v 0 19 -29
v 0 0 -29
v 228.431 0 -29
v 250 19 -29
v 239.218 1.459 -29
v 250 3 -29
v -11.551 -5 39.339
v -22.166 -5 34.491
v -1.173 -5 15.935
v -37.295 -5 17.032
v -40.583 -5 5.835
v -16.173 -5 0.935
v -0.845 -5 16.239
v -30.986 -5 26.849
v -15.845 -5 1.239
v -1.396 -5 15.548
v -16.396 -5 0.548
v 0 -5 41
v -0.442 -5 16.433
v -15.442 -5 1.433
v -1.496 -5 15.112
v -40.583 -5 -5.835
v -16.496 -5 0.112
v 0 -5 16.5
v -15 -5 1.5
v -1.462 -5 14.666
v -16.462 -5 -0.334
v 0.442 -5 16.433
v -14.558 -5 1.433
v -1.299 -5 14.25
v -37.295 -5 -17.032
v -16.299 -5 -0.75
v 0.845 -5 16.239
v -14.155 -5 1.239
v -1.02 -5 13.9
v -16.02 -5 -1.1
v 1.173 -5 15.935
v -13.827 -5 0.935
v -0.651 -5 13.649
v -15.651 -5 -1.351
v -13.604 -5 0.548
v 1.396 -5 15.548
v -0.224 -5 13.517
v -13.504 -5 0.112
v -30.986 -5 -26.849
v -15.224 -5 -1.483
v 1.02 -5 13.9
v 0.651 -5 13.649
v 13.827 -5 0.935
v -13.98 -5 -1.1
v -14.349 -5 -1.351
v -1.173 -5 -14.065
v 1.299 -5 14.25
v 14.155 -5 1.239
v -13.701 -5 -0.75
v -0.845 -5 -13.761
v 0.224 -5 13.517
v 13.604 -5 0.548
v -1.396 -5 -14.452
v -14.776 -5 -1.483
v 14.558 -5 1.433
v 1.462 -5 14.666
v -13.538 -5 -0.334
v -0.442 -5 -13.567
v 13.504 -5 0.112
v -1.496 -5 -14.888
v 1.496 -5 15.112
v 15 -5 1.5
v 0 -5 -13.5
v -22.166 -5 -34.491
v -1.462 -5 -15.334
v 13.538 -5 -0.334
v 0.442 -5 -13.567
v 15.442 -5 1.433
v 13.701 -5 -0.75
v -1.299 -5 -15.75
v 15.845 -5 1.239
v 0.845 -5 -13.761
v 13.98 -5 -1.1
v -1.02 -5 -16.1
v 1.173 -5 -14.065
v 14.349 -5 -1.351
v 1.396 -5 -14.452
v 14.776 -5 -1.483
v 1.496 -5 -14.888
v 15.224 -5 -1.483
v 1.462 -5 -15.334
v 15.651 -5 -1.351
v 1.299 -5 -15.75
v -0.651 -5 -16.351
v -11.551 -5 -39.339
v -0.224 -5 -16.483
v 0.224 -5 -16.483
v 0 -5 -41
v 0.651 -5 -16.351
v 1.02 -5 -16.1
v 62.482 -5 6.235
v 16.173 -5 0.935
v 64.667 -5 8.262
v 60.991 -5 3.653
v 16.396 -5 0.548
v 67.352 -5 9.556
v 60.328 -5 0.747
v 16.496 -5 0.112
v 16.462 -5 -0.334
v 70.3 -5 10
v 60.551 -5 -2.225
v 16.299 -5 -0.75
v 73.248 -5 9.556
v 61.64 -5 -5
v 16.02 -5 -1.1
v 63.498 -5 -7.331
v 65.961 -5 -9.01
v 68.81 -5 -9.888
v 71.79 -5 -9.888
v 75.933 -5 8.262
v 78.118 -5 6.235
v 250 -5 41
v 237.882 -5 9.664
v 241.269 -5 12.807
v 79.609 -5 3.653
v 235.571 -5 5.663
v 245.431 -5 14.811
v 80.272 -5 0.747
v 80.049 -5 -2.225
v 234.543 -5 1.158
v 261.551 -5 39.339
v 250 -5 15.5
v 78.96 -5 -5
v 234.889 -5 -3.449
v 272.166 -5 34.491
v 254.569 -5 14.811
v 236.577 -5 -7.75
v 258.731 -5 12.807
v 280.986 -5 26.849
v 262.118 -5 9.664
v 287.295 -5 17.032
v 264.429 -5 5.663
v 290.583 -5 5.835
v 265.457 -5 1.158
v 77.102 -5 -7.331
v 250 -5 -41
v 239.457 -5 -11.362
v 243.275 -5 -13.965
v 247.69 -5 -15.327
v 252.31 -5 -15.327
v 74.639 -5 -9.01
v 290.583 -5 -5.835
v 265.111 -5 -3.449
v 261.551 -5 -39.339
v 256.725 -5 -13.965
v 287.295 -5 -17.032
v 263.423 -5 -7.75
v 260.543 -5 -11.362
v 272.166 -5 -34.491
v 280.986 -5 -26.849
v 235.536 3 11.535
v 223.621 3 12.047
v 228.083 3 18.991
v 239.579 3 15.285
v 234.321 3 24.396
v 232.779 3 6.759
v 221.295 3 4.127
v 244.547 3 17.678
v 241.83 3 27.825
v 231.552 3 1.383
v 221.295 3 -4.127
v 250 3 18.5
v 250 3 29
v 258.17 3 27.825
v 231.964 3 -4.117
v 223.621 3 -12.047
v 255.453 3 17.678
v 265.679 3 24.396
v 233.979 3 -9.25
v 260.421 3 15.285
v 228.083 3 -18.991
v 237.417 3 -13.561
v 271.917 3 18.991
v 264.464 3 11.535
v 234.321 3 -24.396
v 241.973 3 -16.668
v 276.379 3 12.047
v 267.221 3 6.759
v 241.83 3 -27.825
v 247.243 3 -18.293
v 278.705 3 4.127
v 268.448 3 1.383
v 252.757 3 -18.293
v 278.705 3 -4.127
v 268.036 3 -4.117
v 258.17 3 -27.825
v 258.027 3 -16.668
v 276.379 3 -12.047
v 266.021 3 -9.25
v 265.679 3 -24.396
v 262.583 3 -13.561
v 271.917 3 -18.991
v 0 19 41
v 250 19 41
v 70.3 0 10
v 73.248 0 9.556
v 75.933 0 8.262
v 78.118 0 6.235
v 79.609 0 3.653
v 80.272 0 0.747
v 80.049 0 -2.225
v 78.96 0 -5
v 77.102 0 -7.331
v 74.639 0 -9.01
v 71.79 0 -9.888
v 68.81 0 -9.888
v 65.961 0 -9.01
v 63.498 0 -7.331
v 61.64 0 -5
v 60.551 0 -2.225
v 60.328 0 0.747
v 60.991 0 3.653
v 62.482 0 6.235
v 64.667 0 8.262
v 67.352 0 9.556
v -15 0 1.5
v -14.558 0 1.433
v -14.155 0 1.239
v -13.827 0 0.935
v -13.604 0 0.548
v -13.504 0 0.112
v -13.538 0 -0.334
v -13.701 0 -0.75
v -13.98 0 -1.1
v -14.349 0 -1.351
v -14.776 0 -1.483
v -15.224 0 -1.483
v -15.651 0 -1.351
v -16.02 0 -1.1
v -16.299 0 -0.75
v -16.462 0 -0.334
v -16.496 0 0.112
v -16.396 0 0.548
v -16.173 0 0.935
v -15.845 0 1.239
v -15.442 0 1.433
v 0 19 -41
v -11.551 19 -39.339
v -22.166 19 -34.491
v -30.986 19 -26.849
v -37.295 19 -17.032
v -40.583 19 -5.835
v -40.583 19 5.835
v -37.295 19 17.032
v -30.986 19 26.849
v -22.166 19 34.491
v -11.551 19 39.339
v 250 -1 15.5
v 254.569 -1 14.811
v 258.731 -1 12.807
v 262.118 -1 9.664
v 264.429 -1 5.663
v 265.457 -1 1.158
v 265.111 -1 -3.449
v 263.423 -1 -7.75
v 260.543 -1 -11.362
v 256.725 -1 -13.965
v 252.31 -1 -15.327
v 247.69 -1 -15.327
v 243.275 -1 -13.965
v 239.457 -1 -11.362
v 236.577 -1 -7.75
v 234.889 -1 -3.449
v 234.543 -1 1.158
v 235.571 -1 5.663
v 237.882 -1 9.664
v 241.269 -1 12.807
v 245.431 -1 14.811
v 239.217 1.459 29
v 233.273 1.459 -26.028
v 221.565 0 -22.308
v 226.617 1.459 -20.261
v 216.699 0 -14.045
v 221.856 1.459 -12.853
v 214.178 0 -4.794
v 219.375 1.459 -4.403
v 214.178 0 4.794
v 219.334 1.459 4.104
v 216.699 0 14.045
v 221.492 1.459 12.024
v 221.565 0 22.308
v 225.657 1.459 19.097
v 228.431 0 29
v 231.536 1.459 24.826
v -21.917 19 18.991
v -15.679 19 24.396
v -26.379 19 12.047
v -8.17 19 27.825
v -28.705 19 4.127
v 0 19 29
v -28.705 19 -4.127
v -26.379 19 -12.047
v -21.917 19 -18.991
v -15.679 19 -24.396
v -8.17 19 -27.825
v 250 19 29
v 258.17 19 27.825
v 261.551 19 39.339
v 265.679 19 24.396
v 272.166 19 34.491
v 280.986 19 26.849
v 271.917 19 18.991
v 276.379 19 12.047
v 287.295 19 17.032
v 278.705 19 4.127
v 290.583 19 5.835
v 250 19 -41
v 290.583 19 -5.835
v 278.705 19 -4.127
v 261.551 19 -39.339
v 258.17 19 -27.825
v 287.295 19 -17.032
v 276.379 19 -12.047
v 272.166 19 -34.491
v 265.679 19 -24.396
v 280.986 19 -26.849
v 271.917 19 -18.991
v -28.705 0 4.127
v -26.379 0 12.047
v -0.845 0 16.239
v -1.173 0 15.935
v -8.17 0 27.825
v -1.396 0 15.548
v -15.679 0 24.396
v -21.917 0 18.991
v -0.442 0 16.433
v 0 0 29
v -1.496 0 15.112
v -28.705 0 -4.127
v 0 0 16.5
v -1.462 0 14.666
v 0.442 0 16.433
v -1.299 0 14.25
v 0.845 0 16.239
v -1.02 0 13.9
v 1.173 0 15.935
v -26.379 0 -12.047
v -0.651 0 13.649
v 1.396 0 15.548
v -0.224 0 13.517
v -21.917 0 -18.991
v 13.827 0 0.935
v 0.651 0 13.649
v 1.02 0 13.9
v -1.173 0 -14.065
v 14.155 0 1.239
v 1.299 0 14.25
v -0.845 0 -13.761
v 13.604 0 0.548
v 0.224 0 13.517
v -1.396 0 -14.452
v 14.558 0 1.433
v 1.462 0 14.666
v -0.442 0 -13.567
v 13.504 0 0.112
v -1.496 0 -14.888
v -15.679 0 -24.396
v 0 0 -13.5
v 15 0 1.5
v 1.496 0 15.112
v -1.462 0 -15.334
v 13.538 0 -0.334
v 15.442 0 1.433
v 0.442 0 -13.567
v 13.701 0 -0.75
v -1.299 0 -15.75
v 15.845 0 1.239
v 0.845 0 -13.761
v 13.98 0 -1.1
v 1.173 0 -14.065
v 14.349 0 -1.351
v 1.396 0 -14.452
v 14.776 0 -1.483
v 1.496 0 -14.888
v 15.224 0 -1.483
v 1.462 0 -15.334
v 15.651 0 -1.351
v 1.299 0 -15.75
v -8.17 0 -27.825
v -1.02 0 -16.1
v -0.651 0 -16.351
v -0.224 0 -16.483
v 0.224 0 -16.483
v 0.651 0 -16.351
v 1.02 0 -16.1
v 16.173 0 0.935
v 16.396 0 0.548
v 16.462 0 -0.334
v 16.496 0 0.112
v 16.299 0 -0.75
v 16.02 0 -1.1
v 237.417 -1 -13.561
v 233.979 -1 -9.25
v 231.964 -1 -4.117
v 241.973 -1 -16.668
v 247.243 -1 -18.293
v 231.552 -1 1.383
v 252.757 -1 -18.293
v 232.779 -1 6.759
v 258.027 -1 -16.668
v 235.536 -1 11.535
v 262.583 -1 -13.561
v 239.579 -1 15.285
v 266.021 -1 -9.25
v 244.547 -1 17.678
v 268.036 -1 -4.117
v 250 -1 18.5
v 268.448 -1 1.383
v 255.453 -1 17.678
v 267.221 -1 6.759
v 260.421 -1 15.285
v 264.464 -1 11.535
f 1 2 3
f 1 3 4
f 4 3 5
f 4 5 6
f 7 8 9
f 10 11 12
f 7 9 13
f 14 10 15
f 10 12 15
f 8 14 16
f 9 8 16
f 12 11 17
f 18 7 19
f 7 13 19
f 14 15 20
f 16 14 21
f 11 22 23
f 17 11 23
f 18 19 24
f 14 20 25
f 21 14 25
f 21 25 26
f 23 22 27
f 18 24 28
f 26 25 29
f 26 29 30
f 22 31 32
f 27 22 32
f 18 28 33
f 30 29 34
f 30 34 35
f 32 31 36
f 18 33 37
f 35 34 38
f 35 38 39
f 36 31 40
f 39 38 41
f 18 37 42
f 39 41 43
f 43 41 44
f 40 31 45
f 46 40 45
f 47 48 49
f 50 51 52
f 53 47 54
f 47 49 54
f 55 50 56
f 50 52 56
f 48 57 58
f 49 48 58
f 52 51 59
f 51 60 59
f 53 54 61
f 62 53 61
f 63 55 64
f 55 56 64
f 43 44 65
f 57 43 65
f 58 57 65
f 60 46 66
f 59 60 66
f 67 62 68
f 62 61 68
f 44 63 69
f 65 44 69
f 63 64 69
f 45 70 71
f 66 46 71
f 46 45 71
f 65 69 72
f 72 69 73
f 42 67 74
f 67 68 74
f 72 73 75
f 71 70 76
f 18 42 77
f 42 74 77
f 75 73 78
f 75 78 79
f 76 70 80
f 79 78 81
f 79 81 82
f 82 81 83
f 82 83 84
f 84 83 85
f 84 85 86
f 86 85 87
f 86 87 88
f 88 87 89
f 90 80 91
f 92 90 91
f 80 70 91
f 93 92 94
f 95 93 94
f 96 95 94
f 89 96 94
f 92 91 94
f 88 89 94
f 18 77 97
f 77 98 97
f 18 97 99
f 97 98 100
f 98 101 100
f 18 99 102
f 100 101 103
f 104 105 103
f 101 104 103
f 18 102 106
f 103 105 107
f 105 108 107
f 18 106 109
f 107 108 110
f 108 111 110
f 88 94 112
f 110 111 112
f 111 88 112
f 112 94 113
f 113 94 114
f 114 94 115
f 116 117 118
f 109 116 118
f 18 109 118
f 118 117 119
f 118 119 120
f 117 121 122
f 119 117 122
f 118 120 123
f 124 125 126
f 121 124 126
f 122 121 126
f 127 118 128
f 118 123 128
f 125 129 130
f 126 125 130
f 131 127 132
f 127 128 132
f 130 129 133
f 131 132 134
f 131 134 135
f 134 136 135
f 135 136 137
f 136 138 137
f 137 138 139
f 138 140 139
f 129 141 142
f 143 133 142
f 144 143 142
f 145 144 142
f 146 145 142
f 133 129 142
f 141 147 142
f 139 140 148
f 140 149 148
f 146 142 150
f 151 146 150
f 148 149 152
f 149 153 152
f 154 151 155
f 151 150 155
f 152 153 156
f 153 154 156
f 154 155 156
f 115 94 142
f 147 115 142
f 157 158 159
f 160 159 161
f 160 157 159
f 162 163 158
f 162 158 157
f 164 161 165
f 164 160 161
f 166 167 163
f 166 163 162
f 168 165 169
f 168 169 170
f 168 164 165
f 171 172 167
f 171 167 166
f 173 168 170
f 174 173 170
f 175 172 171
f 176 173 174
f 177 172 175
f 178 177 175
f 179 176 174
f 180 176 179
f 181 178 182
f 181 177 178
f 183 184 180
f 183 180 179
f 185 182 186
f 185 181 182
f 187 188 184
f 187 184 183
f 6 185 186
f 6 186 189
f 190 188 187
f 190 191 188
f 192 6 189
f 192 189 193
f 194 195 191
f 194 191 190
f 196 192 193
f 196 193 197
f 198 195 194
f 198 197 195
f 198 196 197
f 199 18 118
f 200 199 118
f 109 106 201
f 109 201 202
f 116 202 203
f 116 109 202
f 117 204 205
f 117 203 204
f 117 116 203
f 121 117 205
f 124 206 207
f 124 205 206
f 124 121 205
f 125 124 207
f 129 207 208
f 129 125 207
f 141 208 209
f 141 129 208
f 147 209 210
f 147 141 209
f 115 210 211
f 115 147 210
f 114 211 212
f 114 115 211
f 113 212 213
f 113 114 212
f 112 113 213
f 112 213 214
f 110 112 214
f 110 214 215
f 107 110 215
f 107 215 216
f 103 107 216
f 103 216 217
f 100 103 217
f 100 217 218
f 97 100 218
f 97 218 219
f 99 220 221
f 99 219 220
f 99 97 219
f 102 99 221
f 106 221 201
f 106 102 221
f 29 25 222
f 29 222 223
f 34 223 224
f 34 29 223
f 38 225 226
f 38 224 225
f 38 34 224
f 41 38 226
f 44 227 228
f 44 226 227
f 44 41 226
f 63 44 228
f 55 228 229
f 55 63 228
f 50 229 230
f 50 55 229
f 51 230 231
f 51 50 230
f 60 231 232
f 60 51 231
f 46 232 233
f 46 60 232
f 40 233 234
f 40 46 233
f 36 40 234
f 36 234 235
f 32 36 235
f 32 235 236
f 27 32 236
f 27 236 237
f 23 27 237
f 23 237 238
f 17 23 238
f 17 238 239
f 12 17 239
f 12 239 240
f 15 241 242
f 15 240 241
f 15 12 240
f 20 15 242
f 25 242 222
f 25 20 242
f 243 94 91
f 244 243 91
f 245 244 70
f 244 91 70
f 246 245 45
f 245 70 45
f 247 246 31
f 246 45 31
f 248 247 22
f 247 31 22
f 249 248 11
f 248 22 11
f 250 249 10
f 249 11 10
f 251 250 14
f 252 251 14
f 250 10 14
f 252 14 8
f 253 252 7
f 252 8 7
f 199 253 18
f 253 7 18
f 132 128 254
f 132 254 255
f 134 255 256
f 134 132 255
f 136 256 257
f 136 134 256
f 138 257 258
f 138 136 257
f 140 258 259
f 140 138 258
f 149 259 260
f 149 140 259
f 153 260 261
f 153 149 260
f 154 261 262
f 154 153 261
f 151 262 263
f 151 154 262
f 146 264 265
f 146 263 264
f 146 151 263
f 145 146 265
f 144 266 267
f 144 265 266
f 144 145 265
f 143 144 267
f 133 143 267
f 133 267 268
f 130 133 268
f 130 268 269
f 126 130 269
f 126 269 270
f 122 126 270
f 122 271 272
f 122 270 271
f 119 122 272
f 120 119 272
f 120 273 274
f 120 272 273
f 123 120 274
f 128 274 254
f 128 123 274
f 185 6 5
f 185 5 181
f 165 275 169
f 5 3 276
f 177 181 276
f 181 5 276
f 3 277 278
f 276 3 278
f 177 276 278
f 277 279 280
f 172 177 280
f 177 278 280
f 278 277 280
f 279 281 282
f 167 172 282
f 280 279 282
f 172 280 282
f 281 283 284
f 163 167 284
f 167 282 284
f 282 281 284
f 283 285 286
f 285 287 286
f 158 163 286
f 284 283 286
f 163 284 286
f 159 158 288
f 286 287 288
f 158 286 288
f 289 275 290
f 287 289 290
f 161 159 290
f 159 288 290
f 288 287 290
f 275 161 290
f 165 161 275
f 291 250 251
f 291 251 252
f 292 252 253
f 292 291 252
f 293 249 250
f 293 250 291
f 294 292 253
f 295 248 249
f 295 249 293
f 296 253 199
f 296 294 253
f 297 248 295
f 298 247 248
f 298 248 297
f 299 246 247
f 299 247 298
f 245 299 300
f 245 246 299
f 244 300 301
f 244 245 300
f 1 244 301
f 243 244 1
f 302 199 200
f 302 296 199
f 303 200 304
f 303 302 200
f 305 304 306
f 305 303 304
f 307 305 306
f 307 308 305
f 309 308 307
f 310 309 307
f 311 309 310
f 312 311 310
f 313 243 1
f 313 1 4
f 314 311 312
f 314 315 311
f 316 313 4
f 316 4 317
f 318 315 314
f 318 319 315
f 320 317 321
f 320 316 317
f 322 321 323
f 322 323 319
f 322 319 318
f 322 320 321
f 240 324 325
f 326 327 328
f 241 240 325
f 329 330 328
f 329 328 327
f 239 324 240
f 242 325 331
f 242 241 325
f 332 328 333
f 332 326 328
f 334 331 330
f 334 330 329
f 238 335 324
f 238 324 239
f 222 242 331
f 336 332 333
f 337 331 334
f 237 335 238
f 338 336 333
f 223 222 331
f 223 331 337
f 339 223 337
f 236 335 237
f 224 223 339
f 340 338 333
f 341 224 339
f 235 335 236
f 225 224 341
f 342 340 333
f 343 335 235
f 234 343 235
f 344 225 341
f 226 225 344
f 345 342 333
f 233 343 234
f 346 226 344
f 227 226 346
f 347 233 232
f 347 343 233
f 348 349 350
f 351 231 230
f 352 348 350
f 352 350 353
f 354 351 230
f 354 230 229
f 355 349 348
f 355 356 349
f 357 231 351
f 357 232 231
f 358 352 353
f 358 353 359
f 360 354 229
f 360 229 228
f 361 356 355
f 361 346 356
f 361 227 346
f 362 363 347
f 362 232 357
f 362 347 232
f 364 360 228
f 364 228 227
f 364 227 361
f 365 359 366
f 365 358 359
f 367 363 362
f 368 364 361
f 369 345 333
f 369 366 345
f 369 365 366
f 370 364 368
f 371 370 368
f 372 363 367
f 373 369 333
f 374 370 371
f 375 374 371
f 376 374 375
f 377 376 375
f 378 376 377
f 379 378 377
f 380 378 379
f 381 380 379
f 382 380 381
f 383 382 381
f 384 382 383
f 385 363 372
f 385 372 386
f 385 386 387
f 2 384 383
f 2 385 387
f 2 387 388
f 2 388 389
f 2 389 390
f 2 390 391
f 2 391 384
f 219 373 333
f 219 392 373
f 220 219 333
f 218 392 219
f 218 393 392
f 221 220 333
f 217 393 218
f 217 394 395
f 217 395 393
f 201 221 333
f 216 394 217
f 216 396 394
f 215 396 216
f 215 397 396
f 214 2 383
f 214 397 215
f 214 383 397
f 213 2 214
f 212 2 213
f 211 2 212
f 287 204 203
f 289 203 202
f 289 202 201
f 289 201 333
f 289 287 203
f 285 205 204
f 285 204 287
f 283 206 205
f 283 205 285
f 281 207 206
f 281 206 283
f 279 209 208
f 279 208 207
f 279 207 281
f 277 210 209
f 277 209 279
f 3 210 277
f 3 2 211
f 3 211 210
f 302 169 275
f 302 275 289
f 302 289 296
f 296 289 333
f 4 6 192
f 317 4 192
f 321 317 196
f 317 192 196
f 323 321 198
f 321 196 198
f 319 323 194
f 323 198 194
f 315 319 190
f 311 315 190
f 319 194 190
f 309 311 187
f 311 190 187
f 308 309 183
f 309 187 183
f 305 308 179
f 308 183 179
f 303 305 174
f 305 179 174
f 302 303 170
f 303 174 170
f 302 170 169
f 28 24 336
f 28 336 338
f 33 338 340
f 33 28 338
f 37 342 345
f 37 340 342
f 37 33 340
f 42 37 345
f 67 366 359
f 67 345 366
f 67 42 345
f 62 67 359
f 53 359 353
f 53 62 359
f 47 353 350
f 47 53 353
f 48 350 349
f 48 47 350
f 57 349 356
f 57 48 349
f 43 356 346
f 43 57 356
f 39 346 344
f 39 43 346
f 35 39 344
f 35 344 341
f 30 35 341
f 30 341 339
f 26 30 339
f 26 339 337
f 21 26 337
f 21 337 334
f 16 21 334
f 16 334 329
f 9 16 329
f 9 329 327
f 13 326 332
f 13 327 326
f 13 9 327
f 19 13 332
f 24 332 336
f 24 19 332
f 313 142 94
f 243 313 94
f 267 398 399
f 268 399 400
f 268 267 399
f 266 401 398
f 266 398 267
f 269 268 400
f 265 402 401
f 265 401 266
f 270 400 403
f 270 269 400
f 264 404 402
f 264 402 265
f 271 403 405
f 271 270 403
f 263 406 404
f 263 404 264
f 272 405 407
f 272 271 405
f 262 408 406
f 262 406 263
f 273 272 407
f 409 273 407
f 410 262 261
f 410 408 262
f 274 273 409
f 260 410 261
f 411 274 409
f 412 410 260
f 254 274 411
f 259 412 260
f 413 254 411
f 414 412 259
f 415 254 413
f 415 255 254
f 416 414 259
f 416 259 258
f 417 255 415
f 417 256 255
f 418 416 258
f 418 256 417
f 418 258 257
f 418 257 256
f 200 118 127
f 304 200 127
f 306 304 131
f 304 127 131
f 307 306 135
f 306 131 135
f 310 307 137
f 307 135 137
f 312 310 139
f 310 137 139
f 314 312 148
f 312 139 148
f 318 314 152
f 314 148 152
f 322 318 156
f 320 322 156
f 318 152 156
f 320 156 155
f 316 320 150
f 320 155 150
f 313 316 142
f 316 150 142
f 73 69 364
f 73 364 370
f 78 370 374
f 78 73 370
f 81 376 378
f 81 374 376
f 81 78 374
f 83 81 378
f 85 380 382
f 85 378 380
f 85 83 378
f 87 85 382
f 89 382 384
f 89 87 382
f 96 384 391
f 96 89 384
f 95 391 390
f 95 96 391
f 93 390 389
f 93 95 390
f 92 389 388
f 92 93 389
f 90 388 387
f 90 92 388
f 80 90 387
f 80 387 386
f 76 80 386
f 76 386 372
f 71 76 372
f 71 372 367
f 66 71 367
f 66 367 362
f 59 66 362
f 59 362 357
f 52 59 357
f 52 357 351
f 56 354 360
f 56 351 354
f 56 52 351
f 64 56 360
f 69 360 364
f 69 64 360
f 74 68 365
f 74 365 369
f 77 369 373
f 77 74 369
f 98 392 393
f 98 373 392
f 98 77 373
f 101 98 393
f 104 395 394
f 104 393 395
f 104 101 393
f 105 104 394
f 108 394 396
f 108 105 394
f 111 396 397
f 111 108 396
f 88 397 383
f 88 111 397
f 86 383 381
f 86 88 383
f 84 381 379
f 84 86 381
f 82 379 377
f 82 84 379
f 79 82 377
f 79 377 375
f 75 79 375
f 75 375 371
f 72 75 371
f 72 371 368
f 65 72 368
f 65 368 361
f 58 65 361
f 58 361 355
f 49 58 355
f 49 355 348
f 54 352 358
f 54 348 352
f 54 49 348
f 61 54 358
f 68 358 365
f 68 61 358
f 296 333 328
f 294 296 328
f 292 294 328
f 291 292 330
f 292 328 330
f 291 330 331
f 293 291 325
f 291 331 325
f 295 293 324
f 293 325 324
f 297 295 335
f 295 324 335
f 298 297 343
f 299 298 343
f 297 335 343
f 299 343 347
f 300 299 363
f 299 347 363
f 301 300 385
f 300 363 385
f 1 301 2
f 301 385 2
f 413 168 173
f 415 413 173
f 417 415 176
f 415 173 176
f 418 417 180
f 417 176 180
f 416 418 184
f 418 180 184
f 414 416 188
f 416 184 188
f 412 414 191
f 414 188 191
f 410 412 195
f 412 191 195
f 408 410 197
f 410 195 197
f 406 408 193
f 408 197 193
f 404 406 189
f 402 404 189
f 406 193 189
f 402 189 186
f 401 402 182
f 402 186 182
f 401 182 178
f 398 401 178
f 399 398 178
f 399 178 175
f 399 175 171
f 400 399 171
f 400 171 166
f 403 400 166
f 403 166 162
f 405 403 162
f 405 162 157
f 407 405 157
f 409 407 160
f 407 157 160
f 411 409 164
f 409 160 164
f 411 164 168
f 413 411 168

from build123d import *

# Parameters (mm, degrees)
BOSS_EXTRUDE1_DEPTH     = 19
BOSS_EXTRUDE2_START     = -5
BOSS_EXTRUDE2_DEPTH     = 5
CUT_EXTRUDE1_DEPTH      = 295.487690744
CUT_EXTRUDE1_DEPTH_BACK = 295.487690744
SKETCH3_R               = 1.5
SKETCH4_R               = 29
BOSS_EXTRUDE3_DEPTH     = 3
SKETCH5_R               = 18.5
CUT_EXTRUDE2_DEPTH      = 4
CUT_EXTRUDE3_DEPTH      = 295.553899991
CUT_EXTRUDE3_DEPTH_BACK = 295.553899991
SKETCH6_R               = 15.5
FILLET1_R               = 10
CUT_EXTRUDE4_DEPTH      = 295.487690751
CUT_EXTRUDE4_DEPTH_BACK = 295.487690751
SKETCH7_R               = 10


with BuildPart() as part:
    # Sketch1 → Boss-Extrude1 (new body)
    with BuildSketch(Plane(origin=(0, 0, 0), x_dir=(1, 0, 0), z_dir=(0, 1, 0))):
        with BuildLine():
            Line((0, -41), (250, -41))
            ThreePointArc((250, -41), (291, 0), (250, 41))
            Line((250, 41), (0, 41))
            ThreePointArc((0, 41), (-41, 0), (0, -41))
        make_face()
        with BuildLine():
            Line((0, 29), (250, 29))
            ThreePointArc((250, 29), (279, 0), (250, -29))
            Line((250, -29), (0, -29))
            ThreePointArc((0, -29), (-29, 0), (0, 29))
        make_face(mode=Mode.SUBTRACT)
    extrude(amount=BOSS_EXTRUDE1_DEPTH)

    # Sketch1<2> → Boss-Extrude2 (add)
    with BuildSketch(Plane(origin=(0, 0, 0), x_dir=(1, 0, 0), z_dir=(0, 1, 0)).offset(BOSS_EXTRUDE2_START)):
        with BuildLine():
            ThreePointArc((0, 41), (-41, 0), (0, -41))
            Line((0, -41), (250, -41))
            ThreePointArc((250, -41), (291, 0), (250, 41))
            Line((250, 41), (0, 41))
        make_face()
    extrude(amount=BOSS_EXTRUDE2_DEPTH)

    # Sketch3 → Cut-Extrude1 (cut, two sides: drawn at the far end of the back side and taken through both)
    with BuildSketch(Plane(origin=(0, 0, 0), x_dir=(1, 0, 0), z_dir=(0, 1, 0)).offset(-CUT_EXTRUDE1_DEPTH_BACK)):
        with Locations(Location((0, 15, 0), (0, 0, 270))):
            Circle(SKETCH3_R)
        with Locations(Location((15, 0, 0), (0, 0, 270))):
            Circle(SKETCH3_R)
        with Locations(Location((0, -15, 0), (0, 0, 270))):
            Circle(SKETCH3_R)
        with Locations(Location((-15, 0, 0), (0, 0, 270))):
            Circle(SKETCH3_R)
    extrude(amount=CUT_EXTRUDE1_DEPTH + CUT_EXTRUDE1_DEPTH_BACK, mode=Mode.SUBTRACT)

    # Sketch4 → Boss-Extrude3 (add)
    with BuildSketch(Plane(origin=(0, 0, 0), x_dir=(1, 0, 0), z_dir=(0, 1, 0))):
        with Locations((250, 0)):
            Circle(SKETCH4_R)
    extrude(amount=BOSS_EXTRUDE3_DEPTH)

    # Sketch5 → Cut-Extrude2 (cut)
    with BuildSketch(Plane(origin=(0, 3, 0), x_dir=(1, 0, 0), z_dir=(0, 1, 0))):
        with Locations(Location((250, 0, 0), (0, 0, 270))):
            Circle(SKETCH5_R)
    extrude(amount=-CUT_EXTRUDE2_DEPTH, mode=Mode.SUBTRACT)

    # Sketch6 → Cut-Extrude3 (cut, two sides: drawn at the far end of the back side and taken through both)
    with BuildSketch(Plane(origin=(0, -1, 0), x_dir=(1, 0, 0), z_dir=(0, 1, 0)).offset(-CUT_EXTRUDE3_DEPTH_BACK)):
        with Locations(Location((250, 0, 0), (0, 0, 270))):
            Circle(SKETCH6_R)
    extrude(amount=CUT_EXTRUDE3_DEPTH + CUT_EXTRUDE3_DEPTH_BACK, mode=Mode.SUBTRACT)

    # Fillet1
    # the kernel refuses this fillet: 10 mm, written as the material it adds along each edge
    with BuildSketch(Plane(origin=(250, 0, 0), x_dir=(0.5782894613752282, 0, -0.8158316608604672), z_dir=(0.8158316608604672, 0, 0.5782894613752282))) as fillet1_piece_1:
        with BuildLine():
            CenterArc((36.141428429, 10), FILLET1_R, 224.427004001, 45.572995999)
            Line((36.141428429, 0), (36.141428429, -0.2))
            Line((36.141428429, -0.2), (29, -0.2))
            Line((29, -0.2), (28.8, 0))
            ThreePointArc((28.8, 0), (28.8, 1.5), (28.857171431, 2.86))
            Line((28.857171431, 2.86), (29, 3))
        make_face()
    revolve(axis=Axis((250, 0, 0), (0, 1, 0)), revolution_arc=250.660644369)

    # Sketch7 → Cut-Extrude4 (cut, two sides: drawn at the far end of the back side and taken through both)
    with BuildSketch(Plane(origin=(0, 0, 0), x_dir=(1, 0, 0), z_dir=(0, 1, 0)).offset(-CUT_EXTRUDE4_DEPTH_BACK)):
        with Locations(Location((70.3, 0, 0), (0, 0, 270))):
            Circle(SKETCH7_R)
    extrude(amount=CUT_EXTRUDE4_DEPTH + CUT_EXTRUDE4_DEPTH_BACK, mode=Mode.SUBTRACT)


solid = part.part
